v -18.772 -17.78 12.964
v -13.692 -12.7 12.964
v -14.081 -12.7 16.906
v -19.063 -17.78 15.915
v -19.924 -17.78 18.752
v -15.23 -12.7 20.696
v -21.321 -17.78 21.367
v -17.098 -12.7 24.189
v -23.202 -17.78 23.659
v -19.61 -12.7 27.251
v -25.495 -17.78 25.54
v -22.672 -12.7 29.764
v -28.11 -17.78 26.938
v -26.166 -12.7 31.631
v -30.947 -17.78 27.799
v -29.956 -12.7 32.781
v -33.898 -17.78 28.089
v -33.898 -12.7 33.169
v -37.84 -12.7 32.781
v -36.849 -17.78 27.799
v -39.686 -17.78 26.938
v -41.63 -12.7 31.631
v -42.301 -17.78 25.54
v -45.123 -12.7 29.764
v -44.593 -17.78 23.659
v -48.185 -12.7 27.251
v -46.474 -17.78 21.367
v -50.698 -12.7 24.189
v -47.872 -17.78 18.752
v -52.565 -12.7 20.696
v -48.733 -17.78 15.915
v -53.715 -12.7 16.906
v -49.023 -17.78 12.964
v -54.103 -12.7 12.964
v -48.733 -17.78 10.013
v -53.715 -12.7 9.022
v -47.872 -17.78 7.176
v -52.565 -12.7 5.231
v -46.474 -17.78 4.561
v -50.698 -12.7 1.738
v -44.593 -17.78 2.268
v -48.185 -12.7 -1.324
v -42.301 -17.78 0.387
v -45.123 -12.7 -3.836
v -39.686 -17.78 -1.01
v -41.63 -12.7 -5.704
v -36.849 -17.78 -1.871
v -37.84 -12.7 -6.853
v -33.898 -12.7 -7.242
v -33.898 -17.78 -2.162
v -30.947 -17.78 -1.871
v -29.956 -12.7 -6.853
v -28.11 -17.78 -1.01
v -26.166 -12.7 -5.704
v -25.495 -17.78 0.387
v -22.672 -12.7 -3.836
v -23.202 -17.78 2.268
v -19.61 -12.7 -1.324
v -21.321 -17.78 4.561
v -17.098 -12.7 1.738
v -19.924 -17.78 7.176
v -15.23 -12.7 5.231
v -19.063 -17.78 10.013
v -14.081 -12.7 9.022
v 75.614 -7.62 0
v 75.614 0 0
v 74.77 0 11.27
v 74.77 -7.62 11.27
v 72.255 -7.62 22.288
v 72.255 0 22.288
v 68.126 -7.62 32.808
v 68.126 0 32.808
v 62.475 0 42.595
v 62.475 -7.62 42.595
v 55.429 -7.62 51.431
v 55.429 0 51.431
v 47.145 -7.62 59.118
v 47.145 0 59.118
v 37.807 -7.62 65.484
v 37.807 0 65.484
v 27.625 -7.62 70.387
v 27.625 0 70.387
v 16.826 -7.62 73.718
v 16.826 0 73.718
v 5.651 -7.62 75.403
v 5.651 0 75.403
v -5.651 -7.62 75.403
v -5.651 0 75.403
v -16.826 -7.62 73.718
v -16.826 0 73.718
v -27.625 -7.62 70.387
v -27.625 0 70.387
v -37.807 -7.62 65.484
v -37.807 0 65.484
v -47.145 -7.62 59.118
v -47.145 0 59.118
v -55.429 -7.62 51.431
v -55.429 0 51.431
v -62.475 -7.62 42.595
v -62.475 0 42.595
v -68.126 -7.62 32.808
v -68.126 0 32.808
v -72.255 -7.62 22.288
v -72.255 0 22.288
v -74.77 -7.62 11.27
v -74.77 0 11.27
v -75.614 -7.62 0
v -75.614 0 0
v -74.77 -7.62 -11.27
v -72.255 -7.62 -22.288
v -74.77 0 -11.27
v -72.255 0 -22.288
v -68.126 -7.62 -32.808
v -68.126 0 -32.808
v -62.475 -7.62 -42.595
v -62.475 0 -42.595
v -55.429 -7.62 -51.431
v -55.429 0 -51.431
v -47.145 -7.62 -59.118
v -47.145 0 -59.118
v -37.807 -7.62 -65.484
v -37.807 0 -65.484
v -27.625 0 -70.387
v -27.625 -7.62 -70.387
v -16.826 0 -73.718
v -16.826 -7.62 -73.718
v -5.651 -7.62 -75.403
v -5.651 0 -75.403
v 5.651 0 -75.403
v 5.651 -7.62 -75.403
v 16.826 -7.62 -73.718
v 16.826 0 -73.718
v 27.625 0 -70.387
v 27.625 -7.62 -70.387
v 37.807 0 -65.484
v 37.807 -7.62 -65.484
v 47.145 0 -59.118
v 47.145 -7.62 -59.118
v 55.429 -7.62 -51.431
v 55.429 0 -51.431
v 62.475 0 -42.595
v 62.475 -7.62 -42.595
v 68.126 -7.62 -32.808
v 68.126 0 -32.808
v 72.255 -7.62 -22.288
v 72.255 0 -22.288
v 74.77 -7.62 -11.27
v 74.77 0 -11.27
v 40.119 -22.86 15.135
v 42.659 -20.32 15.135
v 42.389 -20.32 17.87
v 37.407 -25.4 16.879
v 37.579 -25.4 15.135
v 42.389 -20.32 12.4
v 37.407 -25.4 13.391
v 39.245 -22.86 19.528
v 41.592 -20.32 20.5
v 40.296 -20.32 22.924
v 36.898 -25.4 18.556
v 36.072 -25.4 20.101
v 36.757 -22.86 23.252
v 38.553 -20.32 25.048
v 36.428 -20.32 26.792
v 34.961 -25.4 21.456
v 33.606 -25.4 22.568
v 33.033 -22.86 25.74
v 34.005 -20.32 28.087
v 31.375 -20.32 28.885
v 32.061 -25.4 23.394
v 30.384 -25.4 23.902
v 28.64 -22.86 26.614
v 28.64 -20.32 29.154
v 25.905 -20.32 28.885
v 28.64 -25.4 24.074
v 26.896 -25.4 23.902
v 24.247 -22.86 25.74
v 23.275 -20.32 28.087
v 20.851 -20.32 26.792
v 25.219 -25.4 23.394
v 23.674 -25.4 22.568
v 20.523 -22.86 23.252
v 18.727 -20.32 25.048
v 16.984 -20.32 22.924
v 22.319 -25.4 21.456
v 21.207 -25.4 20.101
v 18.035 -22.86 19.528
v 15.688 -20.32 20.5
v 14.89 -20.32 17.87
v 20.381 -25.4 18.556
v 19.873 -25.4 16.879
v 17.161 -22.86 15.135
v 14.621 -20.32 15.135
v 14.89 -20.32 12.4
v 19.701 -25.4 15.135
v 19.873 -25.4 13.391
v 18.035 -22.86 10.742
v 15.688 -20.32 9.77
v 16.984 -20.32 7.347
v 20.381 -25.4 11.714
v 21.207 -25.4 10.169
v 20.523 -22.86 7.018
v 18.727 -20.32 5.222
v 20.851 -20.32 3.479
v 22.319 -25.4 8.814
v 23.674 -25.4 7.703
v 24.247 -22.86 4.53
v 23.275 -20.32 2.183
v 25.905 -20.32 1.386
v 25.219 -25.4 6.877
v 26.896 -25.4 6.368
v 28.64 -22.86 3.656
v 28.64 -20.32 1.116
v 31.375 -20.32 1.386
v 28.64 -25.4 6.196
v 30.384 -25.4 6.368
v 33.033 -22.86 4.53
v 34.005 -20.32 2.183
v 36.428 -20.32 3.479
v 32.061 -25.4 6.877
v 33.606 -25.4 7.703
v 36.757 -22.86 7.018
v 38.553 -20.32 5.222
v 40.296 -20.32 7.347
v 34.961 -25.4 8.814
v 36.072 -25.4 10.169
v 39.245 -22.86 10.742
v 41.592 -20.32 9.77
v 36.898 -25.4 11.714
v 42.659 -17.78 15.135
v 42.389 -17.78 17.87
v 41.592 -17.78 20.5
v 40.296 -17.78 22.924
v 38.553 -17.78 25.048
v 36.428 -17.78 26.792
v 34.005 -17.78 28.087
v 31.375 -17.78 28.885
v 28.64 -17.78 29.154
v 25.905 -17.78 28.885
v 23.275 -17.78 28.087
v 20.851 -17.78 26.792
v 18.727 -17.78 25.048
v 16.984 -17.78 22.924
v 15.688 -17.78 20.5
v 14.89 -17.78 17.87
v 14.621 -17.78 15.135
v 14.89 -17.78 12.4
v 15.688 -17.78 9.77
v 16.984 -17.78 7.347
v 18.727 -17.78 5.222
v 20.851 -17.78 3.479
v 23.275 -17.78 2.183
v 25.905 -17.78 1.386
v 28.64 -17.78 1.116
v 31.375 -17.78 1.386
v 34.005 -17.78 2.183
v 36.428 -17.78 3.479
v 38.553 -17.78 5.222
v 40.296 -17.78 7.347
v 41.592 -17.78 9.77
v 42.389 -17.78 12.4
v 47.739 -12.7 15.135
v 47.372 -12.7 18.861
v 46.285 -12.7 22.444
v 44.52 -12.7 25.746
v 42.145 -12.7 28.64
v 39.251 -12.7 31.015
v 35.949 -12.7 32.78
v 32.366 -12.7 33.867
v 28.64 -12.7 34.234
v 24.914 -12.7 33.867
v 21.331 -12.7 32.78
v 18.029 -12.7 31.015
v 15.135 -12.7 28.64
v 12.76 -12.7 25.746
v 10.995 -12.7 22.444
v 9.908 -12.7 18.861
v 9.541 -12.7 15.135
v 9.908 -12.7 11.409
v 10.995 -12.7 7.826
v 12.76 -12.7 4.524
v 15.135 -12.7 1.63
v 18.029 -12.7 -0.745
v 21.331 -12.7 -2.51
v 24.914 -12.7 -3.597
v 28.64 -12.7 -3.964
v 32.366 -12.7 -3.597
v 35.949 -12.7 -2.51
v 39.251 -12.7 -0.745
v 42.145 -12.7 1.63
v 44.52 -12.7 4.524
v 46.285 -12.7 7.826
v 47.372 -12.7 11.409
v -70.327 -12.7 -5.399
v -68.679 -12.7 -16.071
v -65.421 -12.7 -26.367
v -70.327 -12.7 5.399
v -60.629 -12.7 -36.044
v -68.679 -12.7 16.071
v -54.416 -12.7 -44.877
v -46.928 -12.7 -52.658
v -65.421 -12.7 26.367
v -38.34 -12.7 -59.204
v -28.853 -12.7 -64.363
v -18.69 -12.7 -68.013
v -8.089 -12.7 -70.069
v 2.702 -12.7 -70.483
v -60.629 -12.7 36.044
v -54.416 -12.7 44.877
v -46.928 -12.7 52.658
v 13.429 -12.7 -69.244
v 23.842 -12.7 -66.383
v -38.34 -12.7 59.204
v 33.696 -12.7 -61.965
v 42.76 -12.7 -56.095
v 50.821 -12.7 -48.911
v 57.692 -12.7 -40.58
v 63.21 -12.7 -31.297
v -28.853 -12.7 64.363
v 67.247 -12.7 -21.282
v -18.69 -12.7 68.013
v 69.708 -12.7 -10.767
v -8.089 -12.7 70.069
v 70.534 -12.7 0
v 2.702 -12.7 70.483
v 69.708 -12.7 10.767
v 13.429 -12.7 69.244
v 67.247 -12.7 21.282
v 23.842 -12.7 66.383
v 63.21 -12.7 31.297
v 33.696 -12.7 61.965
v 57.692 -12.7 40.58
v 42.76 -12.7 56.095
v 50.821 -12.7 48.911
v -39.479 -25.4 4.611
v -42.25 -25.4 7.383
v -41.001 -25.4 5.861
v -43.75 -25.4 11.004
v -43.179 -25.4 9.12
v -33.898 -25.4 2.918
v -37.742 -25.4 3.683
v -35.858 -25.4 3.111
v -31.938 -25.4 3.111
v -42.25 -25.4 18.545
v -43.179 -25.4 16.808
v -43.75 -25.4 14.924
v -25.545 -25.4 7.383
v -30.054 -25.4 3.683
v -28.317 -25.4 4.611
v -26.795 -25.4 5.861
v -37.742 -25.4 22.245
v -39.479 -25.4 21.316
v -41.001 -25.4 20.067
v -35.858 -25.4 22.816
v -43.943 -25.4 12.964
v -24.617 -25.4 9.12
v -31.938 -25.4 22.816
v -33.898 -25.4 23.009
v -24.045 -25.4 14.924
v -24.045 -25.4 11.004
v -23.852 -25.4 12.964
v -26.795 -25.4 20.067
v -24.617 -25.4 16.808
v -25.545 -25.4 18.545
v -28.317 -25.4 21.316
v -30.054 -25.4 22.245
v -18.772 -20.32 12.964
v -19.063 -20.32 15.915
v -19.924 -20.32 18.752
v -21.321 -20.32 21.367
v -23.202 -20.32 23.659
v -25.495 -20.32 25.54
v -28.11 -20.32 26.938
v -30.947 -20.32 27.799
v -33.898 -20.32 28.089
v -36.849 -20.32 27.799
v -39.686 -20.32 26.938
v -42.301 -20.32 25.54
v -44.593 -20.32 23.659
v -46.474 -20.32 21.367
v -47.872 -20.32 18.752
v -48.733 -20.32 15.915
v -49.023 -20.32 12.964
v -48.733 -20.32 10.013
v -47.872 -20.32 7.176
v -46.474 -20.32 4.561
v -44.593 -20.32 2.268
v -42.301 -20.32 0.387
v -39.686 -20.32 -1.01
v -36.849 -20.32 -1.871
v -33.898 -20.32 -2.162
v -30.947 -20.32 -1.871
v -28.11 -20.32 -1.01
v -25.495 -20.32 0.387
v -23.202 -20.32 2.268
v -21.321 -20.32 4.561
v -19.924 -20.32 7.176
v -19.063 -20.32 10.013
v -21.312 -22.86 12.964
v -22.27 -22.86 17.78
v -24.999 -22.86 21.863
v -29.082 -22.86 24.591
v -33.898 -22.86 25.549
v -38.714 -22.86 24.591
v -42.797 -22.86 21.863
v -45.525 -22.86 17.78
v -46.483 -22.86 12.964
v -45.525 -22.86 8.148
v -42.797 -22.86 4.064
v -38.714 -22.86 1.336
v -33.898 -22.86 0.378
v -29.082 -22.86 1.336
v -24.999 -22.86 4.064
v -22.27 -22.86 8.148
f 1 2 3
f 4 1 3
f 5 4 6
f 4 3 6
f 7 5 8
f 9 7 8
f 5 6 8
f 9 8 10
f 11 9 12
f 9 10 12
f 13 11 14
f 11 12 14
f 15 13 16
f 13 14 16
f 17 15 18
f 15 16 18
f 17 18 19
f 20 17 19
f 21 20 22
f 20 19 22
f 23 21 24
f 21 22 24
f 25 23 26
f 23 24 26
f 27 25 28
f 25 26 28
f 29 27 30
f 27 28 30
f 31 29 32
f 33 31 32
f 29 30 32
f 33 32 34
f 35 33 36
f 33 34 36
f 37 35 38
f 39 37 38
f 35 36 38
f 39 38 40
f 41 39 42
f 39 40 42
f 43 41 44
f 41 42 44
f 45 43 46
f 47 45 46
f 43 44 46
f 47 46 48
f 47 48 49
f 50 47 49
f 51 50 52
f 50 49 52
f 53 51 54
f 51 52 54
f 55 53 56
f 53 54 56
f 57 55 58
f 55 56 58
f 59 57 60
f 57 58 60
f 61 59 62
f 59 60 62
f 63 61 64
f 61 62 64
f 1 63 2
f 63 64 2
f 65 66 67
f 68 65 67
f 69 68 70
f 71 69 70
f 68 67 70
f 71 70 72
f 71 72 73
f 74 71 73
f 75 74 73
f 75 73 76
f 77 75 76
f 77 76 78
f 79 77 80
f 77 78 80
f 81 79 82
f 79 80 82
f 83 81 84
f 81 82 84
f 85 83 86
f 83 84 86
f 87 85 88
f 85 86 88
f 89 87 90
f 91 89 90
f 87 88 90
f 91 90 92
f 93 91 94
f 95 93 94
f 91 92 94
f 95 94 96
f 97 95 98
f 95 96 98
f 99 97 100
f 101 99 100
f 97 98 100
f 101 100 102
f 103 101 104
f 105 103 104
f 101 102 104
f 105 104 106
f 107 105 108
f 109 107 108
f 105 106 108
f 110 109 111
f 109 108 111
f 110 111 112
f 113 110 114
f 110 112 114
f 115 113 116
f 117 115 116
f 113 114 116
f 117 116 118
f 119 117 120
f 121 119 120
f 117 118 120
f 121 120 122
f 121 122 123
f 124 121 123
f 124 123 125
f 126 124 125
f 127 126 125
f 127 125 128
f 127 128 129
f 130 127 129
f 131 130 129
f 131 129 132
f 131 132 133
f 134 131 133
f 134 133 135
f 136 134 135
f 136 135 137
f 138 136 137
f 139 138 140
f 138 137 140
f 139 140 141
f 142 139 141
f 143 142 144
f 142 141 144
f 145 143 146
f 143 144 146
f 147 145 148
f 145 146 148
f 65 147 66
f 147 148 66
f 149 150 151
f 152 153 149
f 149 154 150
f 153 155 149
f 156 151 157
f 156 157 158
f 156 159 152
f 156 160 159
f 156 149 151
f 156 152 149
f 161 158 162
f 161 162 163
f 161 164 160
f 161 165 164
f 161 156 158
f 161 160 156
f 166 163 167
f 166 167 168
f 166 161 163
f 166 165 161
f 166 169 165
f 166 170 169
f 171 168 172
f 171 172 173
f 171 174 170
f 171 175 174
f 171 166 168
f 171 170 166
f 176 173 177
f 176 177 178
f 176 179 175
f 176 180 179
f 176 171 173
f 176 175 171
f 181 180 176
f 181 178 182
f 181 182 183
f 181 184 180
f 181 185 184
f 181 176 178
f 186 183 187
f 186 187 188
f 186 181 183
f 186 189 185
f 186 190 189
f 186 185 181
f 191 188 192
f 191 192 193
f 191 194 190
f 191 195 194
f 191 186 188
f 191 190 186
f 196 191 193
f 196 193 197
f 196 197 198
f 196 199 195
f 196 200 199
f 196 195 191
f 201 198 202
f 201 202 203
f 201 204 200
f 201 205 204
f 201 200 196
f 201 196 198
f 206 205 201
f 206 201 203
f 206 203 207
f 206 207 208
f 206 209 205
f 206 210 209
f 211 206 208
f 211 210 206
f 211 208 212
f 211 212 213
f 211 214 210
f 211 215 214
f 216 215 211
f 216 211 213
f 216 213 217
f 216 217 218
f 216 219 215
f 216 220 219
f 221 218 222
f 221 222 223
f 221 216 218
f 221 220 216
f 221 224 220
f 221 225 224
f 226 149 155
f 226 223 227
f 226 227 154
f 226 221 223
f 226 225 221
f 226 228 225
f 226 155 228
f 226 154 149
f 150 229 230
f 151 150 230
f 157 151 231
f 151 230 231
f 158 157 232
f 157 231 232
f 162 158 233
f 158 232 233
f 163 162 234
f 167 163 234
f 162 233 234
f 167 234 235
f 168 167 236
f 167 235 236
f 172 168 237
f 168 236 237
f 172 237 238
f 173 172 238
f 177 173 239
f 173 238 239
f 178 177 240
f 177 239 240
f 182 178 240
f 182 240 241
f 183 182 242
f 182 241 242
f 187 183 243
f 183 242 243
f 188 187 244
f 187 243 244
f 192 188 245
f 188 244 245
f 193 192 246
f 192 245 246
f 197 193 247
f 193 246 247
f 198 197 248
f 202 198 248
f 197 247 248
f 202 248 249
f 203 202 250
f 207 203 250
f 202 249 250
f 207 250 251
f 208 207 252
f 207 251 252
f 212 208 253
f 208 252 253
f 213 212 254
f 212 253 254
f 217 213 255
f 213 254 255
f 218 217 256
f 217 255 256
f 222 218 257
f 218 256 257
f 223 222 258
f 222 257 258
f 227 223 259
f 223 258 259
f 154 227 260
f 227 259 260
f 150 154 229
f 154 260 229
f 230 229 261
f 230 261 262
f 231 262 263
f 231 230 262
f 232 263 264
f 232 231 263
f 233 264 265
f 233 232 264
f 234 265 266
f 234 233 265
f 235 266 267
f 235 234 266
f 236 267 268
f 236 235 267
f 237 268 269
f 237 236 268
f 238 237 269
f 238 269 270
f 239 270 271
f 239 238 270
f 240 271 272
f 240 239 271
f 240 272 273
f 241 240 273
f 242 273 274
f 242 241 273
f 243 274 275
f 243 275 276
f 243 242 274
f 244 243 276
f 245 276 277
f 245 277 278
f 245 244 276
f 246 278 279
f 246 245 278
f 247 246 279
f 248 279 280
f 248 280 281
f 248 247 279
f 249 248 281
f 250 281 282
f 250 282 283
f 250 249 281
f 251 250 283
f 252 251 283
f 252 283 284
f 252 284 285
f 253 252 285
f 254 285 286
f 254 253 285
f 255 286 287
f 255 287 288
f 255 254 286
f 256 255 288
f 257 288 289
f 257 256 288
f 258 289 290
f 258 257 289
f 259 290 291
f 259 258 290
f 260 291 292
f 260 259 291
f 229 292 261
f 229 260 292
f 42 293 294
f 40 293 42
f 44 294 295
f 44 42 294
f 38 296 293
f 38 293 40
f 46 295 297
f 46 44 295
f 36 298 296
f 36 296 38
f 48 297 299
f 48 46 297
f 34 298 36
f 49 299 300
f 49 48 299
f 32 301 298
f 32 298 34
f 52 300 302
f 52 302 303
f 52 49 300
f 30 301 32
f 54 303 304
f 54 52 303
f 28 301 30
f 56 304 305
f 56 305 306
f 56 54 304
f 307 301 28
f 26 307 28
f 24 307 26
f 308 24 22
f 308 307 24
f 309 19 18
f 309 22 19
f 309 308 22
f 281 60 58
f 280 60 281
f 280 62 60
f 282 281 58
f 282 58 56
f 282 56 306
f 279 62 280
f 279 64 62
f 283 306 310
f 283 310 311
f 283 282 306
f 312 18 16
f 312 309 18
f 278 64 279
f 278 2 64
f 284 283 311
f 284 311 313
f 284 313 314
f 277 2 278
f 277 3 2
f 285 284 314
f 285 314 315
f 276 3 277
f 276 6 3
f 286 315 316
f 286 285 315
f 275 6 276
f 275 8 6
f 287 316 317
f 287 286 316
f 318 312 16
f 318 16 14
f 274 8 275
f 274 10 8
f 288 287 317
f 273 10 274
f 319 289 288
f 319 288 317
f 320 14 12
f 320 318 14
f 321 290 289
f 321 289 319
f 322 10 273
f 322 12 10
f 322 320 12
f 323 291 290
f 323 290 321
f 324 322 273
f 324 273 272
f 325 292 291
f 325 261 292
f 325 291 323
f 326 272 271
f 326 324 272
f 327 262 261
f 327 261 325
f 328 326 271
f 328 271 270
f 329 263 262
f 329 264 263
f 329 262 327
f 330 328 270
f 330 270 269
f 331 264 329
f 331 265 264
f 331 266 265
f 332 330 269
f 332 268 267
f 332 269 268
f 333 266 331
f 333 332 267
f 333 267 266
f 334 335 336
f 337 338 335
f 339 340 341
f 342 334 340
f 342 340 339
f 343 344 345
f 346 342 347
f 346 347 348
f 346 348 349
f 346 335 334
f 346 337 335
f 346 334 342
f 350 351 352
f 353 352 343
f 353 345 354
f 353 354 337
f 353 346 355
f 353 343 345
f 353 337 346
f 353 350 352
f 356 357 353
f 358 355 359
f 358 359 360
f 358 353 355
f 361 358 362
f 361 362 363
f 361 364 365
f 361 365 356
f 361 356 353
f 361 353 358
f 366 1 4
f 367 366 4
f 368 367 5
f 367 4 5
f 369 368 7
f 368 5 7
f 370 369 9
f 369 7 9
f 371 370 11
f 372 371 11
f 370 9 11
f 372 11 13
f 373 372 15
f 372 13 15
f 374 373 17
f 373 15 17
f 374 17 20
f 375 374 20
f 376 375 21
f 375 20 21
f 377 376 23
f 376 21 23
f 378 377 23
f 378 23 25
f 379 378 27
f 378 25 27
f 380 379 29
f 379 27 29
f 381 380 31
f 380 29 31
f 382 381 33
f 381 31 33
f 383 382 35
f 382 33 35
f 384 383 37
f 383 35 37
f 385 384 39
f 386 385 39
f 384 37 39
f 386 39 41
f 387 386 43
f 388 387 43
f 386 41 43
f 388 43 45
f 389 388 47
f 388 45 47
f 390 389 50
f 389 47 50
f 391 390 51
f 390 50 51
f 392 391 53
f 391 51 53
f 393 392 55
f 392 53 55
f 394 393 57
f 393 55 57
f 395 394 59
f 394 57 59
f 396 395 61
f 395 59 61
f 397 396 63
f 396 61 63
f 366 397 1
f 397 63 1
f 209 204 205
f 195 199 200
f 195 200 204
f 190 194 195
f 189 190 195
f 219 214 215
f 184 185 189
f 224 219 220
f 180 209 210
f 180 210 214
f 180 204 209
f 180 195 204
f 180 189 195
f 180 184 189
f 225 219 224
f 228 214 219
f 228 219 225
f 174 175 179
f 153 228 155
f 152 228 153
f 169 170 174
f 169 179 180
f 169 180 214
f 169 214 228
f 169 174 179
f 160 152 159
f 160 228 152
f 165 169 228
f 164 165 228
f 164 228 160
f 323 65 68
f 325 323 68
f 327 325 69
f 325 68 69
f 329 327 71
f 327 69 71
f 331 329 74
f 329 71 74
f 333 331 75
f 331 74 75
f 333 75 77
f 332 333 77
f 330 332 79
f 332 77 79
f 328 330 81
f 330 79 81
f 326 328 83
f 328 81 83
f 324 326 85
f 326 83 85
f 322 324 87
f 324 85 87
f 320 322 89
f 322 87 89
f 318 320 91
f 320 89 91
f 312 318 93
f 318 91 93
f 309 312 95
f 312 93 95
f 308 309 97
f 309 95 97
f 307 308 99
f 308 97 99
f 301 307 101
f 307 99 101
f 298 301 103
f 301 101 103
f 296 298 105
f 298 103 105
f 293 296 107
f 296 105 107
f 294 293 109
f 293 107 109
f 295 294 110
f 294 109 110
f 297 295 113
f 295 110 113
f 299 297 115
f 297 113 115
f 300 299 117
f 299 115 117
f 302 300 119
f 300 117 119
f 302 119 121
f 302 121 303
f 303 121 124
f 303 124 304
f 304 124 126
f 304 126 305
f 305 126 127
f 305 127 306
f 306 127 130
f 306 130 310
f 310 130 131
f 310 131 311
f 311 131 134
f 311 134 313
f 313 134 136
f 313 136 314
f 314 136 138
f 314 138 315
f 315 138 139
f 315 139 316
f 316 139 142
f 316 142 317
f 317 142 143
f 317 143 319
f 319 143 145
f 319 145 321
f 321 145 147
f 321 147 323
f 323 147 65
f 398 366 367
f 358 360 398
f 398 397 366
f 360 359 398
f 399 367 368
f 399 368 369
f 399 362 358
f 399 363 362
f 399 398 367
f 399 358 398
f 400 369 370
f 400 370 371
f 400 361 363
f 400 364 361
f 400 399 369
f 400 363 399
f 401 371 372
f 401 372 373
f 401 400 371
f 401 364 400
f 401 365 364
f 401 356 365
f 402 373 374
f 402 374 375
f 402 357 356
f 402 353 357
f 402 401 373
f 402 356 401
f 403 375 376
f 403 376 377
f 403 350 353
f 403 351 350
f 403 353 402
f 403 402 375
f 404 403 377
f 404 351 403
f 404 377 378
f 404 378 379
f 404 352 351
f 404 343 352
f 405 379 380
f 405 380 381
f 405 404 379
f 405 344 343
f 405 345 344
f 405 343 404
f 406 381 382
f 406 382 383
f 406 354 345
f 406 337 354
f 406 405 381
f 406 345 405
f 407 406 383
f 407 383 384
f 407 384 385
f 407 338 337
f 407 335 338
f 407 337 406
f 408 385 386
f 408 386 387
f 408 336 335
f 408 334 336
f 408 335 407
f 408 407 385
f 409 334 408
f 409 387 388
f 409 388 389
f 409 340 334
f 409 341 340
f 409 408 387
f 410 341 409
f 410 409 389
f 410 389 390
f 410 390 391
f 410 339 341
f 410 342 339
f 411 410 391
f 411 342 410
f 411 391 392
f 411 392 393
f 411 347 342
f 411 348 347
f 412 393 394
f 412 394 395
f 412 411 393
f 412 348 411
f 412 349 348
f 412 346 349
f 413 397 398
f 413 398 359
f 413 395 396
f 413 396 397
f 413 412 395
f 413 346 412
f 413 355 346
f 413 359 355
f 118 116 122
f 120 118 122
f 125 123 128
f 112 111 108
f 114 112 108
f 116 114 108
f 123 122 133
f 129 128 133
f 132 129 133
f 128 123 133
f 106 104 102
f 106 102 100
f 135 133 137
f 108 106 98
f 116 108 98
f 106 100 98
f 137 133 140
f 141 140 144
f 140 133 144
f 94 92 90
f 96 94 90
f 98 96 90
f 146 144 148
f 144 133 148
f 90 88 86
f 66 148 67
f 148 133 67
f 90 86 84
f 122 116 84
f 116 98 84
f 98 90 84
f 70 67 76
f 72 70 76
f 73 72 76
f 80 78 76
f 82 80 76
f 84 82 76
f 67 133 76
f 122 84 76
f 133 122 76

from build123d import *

# Parameters (mm, degrees)
F0_R     = 75.614266
F1_DEPTH = 12.7
F2_R     = 14.018878
F2_R_2   = 15.125501
F3_DEPTH = 12.7
F4_SIZE  = 5.08
F5_SIZE  = 5.08


with BuildPart() as f1:
    # F0 (on Front) → F1 (new body)
    with BuildSketch(Plane.XZ):
        Circle(F0_R)
    extrude(amount=F1_DEPTH)

    # F2 (on face) → F3 (join)
    with BuildSketch(Plane.XZ.offset(12.7)):
        with Locations((28.639855, 15.135232)):
            Circle(F2_R)
        with Locations((-33.897843, 12.963785)):
            Circle(F2_R_2)
    extrude(amount=F3_DEPTH)

    # F4
    f4_edges = [f1.edges().sort_by_distance(p)[0] for p in [
        (-49.023345, -25.4, 12.963785),
        (14.620977, -25.4, 15.135232),
    ]]
    chamfer(f4_edges, length=F4_SIZE)

    # F5
    f5_edges = [f1.edges().sort_by_distance(p)[0] for p in [
        (-75.614266, -12.7, 0),
        (-49.023345, -12.7, 12.963785),
        (14.620977, -12.7, 15.135232),
    ]]
    chamfer(f5_edges, length=F5_SIZE)


solid = f1.part
